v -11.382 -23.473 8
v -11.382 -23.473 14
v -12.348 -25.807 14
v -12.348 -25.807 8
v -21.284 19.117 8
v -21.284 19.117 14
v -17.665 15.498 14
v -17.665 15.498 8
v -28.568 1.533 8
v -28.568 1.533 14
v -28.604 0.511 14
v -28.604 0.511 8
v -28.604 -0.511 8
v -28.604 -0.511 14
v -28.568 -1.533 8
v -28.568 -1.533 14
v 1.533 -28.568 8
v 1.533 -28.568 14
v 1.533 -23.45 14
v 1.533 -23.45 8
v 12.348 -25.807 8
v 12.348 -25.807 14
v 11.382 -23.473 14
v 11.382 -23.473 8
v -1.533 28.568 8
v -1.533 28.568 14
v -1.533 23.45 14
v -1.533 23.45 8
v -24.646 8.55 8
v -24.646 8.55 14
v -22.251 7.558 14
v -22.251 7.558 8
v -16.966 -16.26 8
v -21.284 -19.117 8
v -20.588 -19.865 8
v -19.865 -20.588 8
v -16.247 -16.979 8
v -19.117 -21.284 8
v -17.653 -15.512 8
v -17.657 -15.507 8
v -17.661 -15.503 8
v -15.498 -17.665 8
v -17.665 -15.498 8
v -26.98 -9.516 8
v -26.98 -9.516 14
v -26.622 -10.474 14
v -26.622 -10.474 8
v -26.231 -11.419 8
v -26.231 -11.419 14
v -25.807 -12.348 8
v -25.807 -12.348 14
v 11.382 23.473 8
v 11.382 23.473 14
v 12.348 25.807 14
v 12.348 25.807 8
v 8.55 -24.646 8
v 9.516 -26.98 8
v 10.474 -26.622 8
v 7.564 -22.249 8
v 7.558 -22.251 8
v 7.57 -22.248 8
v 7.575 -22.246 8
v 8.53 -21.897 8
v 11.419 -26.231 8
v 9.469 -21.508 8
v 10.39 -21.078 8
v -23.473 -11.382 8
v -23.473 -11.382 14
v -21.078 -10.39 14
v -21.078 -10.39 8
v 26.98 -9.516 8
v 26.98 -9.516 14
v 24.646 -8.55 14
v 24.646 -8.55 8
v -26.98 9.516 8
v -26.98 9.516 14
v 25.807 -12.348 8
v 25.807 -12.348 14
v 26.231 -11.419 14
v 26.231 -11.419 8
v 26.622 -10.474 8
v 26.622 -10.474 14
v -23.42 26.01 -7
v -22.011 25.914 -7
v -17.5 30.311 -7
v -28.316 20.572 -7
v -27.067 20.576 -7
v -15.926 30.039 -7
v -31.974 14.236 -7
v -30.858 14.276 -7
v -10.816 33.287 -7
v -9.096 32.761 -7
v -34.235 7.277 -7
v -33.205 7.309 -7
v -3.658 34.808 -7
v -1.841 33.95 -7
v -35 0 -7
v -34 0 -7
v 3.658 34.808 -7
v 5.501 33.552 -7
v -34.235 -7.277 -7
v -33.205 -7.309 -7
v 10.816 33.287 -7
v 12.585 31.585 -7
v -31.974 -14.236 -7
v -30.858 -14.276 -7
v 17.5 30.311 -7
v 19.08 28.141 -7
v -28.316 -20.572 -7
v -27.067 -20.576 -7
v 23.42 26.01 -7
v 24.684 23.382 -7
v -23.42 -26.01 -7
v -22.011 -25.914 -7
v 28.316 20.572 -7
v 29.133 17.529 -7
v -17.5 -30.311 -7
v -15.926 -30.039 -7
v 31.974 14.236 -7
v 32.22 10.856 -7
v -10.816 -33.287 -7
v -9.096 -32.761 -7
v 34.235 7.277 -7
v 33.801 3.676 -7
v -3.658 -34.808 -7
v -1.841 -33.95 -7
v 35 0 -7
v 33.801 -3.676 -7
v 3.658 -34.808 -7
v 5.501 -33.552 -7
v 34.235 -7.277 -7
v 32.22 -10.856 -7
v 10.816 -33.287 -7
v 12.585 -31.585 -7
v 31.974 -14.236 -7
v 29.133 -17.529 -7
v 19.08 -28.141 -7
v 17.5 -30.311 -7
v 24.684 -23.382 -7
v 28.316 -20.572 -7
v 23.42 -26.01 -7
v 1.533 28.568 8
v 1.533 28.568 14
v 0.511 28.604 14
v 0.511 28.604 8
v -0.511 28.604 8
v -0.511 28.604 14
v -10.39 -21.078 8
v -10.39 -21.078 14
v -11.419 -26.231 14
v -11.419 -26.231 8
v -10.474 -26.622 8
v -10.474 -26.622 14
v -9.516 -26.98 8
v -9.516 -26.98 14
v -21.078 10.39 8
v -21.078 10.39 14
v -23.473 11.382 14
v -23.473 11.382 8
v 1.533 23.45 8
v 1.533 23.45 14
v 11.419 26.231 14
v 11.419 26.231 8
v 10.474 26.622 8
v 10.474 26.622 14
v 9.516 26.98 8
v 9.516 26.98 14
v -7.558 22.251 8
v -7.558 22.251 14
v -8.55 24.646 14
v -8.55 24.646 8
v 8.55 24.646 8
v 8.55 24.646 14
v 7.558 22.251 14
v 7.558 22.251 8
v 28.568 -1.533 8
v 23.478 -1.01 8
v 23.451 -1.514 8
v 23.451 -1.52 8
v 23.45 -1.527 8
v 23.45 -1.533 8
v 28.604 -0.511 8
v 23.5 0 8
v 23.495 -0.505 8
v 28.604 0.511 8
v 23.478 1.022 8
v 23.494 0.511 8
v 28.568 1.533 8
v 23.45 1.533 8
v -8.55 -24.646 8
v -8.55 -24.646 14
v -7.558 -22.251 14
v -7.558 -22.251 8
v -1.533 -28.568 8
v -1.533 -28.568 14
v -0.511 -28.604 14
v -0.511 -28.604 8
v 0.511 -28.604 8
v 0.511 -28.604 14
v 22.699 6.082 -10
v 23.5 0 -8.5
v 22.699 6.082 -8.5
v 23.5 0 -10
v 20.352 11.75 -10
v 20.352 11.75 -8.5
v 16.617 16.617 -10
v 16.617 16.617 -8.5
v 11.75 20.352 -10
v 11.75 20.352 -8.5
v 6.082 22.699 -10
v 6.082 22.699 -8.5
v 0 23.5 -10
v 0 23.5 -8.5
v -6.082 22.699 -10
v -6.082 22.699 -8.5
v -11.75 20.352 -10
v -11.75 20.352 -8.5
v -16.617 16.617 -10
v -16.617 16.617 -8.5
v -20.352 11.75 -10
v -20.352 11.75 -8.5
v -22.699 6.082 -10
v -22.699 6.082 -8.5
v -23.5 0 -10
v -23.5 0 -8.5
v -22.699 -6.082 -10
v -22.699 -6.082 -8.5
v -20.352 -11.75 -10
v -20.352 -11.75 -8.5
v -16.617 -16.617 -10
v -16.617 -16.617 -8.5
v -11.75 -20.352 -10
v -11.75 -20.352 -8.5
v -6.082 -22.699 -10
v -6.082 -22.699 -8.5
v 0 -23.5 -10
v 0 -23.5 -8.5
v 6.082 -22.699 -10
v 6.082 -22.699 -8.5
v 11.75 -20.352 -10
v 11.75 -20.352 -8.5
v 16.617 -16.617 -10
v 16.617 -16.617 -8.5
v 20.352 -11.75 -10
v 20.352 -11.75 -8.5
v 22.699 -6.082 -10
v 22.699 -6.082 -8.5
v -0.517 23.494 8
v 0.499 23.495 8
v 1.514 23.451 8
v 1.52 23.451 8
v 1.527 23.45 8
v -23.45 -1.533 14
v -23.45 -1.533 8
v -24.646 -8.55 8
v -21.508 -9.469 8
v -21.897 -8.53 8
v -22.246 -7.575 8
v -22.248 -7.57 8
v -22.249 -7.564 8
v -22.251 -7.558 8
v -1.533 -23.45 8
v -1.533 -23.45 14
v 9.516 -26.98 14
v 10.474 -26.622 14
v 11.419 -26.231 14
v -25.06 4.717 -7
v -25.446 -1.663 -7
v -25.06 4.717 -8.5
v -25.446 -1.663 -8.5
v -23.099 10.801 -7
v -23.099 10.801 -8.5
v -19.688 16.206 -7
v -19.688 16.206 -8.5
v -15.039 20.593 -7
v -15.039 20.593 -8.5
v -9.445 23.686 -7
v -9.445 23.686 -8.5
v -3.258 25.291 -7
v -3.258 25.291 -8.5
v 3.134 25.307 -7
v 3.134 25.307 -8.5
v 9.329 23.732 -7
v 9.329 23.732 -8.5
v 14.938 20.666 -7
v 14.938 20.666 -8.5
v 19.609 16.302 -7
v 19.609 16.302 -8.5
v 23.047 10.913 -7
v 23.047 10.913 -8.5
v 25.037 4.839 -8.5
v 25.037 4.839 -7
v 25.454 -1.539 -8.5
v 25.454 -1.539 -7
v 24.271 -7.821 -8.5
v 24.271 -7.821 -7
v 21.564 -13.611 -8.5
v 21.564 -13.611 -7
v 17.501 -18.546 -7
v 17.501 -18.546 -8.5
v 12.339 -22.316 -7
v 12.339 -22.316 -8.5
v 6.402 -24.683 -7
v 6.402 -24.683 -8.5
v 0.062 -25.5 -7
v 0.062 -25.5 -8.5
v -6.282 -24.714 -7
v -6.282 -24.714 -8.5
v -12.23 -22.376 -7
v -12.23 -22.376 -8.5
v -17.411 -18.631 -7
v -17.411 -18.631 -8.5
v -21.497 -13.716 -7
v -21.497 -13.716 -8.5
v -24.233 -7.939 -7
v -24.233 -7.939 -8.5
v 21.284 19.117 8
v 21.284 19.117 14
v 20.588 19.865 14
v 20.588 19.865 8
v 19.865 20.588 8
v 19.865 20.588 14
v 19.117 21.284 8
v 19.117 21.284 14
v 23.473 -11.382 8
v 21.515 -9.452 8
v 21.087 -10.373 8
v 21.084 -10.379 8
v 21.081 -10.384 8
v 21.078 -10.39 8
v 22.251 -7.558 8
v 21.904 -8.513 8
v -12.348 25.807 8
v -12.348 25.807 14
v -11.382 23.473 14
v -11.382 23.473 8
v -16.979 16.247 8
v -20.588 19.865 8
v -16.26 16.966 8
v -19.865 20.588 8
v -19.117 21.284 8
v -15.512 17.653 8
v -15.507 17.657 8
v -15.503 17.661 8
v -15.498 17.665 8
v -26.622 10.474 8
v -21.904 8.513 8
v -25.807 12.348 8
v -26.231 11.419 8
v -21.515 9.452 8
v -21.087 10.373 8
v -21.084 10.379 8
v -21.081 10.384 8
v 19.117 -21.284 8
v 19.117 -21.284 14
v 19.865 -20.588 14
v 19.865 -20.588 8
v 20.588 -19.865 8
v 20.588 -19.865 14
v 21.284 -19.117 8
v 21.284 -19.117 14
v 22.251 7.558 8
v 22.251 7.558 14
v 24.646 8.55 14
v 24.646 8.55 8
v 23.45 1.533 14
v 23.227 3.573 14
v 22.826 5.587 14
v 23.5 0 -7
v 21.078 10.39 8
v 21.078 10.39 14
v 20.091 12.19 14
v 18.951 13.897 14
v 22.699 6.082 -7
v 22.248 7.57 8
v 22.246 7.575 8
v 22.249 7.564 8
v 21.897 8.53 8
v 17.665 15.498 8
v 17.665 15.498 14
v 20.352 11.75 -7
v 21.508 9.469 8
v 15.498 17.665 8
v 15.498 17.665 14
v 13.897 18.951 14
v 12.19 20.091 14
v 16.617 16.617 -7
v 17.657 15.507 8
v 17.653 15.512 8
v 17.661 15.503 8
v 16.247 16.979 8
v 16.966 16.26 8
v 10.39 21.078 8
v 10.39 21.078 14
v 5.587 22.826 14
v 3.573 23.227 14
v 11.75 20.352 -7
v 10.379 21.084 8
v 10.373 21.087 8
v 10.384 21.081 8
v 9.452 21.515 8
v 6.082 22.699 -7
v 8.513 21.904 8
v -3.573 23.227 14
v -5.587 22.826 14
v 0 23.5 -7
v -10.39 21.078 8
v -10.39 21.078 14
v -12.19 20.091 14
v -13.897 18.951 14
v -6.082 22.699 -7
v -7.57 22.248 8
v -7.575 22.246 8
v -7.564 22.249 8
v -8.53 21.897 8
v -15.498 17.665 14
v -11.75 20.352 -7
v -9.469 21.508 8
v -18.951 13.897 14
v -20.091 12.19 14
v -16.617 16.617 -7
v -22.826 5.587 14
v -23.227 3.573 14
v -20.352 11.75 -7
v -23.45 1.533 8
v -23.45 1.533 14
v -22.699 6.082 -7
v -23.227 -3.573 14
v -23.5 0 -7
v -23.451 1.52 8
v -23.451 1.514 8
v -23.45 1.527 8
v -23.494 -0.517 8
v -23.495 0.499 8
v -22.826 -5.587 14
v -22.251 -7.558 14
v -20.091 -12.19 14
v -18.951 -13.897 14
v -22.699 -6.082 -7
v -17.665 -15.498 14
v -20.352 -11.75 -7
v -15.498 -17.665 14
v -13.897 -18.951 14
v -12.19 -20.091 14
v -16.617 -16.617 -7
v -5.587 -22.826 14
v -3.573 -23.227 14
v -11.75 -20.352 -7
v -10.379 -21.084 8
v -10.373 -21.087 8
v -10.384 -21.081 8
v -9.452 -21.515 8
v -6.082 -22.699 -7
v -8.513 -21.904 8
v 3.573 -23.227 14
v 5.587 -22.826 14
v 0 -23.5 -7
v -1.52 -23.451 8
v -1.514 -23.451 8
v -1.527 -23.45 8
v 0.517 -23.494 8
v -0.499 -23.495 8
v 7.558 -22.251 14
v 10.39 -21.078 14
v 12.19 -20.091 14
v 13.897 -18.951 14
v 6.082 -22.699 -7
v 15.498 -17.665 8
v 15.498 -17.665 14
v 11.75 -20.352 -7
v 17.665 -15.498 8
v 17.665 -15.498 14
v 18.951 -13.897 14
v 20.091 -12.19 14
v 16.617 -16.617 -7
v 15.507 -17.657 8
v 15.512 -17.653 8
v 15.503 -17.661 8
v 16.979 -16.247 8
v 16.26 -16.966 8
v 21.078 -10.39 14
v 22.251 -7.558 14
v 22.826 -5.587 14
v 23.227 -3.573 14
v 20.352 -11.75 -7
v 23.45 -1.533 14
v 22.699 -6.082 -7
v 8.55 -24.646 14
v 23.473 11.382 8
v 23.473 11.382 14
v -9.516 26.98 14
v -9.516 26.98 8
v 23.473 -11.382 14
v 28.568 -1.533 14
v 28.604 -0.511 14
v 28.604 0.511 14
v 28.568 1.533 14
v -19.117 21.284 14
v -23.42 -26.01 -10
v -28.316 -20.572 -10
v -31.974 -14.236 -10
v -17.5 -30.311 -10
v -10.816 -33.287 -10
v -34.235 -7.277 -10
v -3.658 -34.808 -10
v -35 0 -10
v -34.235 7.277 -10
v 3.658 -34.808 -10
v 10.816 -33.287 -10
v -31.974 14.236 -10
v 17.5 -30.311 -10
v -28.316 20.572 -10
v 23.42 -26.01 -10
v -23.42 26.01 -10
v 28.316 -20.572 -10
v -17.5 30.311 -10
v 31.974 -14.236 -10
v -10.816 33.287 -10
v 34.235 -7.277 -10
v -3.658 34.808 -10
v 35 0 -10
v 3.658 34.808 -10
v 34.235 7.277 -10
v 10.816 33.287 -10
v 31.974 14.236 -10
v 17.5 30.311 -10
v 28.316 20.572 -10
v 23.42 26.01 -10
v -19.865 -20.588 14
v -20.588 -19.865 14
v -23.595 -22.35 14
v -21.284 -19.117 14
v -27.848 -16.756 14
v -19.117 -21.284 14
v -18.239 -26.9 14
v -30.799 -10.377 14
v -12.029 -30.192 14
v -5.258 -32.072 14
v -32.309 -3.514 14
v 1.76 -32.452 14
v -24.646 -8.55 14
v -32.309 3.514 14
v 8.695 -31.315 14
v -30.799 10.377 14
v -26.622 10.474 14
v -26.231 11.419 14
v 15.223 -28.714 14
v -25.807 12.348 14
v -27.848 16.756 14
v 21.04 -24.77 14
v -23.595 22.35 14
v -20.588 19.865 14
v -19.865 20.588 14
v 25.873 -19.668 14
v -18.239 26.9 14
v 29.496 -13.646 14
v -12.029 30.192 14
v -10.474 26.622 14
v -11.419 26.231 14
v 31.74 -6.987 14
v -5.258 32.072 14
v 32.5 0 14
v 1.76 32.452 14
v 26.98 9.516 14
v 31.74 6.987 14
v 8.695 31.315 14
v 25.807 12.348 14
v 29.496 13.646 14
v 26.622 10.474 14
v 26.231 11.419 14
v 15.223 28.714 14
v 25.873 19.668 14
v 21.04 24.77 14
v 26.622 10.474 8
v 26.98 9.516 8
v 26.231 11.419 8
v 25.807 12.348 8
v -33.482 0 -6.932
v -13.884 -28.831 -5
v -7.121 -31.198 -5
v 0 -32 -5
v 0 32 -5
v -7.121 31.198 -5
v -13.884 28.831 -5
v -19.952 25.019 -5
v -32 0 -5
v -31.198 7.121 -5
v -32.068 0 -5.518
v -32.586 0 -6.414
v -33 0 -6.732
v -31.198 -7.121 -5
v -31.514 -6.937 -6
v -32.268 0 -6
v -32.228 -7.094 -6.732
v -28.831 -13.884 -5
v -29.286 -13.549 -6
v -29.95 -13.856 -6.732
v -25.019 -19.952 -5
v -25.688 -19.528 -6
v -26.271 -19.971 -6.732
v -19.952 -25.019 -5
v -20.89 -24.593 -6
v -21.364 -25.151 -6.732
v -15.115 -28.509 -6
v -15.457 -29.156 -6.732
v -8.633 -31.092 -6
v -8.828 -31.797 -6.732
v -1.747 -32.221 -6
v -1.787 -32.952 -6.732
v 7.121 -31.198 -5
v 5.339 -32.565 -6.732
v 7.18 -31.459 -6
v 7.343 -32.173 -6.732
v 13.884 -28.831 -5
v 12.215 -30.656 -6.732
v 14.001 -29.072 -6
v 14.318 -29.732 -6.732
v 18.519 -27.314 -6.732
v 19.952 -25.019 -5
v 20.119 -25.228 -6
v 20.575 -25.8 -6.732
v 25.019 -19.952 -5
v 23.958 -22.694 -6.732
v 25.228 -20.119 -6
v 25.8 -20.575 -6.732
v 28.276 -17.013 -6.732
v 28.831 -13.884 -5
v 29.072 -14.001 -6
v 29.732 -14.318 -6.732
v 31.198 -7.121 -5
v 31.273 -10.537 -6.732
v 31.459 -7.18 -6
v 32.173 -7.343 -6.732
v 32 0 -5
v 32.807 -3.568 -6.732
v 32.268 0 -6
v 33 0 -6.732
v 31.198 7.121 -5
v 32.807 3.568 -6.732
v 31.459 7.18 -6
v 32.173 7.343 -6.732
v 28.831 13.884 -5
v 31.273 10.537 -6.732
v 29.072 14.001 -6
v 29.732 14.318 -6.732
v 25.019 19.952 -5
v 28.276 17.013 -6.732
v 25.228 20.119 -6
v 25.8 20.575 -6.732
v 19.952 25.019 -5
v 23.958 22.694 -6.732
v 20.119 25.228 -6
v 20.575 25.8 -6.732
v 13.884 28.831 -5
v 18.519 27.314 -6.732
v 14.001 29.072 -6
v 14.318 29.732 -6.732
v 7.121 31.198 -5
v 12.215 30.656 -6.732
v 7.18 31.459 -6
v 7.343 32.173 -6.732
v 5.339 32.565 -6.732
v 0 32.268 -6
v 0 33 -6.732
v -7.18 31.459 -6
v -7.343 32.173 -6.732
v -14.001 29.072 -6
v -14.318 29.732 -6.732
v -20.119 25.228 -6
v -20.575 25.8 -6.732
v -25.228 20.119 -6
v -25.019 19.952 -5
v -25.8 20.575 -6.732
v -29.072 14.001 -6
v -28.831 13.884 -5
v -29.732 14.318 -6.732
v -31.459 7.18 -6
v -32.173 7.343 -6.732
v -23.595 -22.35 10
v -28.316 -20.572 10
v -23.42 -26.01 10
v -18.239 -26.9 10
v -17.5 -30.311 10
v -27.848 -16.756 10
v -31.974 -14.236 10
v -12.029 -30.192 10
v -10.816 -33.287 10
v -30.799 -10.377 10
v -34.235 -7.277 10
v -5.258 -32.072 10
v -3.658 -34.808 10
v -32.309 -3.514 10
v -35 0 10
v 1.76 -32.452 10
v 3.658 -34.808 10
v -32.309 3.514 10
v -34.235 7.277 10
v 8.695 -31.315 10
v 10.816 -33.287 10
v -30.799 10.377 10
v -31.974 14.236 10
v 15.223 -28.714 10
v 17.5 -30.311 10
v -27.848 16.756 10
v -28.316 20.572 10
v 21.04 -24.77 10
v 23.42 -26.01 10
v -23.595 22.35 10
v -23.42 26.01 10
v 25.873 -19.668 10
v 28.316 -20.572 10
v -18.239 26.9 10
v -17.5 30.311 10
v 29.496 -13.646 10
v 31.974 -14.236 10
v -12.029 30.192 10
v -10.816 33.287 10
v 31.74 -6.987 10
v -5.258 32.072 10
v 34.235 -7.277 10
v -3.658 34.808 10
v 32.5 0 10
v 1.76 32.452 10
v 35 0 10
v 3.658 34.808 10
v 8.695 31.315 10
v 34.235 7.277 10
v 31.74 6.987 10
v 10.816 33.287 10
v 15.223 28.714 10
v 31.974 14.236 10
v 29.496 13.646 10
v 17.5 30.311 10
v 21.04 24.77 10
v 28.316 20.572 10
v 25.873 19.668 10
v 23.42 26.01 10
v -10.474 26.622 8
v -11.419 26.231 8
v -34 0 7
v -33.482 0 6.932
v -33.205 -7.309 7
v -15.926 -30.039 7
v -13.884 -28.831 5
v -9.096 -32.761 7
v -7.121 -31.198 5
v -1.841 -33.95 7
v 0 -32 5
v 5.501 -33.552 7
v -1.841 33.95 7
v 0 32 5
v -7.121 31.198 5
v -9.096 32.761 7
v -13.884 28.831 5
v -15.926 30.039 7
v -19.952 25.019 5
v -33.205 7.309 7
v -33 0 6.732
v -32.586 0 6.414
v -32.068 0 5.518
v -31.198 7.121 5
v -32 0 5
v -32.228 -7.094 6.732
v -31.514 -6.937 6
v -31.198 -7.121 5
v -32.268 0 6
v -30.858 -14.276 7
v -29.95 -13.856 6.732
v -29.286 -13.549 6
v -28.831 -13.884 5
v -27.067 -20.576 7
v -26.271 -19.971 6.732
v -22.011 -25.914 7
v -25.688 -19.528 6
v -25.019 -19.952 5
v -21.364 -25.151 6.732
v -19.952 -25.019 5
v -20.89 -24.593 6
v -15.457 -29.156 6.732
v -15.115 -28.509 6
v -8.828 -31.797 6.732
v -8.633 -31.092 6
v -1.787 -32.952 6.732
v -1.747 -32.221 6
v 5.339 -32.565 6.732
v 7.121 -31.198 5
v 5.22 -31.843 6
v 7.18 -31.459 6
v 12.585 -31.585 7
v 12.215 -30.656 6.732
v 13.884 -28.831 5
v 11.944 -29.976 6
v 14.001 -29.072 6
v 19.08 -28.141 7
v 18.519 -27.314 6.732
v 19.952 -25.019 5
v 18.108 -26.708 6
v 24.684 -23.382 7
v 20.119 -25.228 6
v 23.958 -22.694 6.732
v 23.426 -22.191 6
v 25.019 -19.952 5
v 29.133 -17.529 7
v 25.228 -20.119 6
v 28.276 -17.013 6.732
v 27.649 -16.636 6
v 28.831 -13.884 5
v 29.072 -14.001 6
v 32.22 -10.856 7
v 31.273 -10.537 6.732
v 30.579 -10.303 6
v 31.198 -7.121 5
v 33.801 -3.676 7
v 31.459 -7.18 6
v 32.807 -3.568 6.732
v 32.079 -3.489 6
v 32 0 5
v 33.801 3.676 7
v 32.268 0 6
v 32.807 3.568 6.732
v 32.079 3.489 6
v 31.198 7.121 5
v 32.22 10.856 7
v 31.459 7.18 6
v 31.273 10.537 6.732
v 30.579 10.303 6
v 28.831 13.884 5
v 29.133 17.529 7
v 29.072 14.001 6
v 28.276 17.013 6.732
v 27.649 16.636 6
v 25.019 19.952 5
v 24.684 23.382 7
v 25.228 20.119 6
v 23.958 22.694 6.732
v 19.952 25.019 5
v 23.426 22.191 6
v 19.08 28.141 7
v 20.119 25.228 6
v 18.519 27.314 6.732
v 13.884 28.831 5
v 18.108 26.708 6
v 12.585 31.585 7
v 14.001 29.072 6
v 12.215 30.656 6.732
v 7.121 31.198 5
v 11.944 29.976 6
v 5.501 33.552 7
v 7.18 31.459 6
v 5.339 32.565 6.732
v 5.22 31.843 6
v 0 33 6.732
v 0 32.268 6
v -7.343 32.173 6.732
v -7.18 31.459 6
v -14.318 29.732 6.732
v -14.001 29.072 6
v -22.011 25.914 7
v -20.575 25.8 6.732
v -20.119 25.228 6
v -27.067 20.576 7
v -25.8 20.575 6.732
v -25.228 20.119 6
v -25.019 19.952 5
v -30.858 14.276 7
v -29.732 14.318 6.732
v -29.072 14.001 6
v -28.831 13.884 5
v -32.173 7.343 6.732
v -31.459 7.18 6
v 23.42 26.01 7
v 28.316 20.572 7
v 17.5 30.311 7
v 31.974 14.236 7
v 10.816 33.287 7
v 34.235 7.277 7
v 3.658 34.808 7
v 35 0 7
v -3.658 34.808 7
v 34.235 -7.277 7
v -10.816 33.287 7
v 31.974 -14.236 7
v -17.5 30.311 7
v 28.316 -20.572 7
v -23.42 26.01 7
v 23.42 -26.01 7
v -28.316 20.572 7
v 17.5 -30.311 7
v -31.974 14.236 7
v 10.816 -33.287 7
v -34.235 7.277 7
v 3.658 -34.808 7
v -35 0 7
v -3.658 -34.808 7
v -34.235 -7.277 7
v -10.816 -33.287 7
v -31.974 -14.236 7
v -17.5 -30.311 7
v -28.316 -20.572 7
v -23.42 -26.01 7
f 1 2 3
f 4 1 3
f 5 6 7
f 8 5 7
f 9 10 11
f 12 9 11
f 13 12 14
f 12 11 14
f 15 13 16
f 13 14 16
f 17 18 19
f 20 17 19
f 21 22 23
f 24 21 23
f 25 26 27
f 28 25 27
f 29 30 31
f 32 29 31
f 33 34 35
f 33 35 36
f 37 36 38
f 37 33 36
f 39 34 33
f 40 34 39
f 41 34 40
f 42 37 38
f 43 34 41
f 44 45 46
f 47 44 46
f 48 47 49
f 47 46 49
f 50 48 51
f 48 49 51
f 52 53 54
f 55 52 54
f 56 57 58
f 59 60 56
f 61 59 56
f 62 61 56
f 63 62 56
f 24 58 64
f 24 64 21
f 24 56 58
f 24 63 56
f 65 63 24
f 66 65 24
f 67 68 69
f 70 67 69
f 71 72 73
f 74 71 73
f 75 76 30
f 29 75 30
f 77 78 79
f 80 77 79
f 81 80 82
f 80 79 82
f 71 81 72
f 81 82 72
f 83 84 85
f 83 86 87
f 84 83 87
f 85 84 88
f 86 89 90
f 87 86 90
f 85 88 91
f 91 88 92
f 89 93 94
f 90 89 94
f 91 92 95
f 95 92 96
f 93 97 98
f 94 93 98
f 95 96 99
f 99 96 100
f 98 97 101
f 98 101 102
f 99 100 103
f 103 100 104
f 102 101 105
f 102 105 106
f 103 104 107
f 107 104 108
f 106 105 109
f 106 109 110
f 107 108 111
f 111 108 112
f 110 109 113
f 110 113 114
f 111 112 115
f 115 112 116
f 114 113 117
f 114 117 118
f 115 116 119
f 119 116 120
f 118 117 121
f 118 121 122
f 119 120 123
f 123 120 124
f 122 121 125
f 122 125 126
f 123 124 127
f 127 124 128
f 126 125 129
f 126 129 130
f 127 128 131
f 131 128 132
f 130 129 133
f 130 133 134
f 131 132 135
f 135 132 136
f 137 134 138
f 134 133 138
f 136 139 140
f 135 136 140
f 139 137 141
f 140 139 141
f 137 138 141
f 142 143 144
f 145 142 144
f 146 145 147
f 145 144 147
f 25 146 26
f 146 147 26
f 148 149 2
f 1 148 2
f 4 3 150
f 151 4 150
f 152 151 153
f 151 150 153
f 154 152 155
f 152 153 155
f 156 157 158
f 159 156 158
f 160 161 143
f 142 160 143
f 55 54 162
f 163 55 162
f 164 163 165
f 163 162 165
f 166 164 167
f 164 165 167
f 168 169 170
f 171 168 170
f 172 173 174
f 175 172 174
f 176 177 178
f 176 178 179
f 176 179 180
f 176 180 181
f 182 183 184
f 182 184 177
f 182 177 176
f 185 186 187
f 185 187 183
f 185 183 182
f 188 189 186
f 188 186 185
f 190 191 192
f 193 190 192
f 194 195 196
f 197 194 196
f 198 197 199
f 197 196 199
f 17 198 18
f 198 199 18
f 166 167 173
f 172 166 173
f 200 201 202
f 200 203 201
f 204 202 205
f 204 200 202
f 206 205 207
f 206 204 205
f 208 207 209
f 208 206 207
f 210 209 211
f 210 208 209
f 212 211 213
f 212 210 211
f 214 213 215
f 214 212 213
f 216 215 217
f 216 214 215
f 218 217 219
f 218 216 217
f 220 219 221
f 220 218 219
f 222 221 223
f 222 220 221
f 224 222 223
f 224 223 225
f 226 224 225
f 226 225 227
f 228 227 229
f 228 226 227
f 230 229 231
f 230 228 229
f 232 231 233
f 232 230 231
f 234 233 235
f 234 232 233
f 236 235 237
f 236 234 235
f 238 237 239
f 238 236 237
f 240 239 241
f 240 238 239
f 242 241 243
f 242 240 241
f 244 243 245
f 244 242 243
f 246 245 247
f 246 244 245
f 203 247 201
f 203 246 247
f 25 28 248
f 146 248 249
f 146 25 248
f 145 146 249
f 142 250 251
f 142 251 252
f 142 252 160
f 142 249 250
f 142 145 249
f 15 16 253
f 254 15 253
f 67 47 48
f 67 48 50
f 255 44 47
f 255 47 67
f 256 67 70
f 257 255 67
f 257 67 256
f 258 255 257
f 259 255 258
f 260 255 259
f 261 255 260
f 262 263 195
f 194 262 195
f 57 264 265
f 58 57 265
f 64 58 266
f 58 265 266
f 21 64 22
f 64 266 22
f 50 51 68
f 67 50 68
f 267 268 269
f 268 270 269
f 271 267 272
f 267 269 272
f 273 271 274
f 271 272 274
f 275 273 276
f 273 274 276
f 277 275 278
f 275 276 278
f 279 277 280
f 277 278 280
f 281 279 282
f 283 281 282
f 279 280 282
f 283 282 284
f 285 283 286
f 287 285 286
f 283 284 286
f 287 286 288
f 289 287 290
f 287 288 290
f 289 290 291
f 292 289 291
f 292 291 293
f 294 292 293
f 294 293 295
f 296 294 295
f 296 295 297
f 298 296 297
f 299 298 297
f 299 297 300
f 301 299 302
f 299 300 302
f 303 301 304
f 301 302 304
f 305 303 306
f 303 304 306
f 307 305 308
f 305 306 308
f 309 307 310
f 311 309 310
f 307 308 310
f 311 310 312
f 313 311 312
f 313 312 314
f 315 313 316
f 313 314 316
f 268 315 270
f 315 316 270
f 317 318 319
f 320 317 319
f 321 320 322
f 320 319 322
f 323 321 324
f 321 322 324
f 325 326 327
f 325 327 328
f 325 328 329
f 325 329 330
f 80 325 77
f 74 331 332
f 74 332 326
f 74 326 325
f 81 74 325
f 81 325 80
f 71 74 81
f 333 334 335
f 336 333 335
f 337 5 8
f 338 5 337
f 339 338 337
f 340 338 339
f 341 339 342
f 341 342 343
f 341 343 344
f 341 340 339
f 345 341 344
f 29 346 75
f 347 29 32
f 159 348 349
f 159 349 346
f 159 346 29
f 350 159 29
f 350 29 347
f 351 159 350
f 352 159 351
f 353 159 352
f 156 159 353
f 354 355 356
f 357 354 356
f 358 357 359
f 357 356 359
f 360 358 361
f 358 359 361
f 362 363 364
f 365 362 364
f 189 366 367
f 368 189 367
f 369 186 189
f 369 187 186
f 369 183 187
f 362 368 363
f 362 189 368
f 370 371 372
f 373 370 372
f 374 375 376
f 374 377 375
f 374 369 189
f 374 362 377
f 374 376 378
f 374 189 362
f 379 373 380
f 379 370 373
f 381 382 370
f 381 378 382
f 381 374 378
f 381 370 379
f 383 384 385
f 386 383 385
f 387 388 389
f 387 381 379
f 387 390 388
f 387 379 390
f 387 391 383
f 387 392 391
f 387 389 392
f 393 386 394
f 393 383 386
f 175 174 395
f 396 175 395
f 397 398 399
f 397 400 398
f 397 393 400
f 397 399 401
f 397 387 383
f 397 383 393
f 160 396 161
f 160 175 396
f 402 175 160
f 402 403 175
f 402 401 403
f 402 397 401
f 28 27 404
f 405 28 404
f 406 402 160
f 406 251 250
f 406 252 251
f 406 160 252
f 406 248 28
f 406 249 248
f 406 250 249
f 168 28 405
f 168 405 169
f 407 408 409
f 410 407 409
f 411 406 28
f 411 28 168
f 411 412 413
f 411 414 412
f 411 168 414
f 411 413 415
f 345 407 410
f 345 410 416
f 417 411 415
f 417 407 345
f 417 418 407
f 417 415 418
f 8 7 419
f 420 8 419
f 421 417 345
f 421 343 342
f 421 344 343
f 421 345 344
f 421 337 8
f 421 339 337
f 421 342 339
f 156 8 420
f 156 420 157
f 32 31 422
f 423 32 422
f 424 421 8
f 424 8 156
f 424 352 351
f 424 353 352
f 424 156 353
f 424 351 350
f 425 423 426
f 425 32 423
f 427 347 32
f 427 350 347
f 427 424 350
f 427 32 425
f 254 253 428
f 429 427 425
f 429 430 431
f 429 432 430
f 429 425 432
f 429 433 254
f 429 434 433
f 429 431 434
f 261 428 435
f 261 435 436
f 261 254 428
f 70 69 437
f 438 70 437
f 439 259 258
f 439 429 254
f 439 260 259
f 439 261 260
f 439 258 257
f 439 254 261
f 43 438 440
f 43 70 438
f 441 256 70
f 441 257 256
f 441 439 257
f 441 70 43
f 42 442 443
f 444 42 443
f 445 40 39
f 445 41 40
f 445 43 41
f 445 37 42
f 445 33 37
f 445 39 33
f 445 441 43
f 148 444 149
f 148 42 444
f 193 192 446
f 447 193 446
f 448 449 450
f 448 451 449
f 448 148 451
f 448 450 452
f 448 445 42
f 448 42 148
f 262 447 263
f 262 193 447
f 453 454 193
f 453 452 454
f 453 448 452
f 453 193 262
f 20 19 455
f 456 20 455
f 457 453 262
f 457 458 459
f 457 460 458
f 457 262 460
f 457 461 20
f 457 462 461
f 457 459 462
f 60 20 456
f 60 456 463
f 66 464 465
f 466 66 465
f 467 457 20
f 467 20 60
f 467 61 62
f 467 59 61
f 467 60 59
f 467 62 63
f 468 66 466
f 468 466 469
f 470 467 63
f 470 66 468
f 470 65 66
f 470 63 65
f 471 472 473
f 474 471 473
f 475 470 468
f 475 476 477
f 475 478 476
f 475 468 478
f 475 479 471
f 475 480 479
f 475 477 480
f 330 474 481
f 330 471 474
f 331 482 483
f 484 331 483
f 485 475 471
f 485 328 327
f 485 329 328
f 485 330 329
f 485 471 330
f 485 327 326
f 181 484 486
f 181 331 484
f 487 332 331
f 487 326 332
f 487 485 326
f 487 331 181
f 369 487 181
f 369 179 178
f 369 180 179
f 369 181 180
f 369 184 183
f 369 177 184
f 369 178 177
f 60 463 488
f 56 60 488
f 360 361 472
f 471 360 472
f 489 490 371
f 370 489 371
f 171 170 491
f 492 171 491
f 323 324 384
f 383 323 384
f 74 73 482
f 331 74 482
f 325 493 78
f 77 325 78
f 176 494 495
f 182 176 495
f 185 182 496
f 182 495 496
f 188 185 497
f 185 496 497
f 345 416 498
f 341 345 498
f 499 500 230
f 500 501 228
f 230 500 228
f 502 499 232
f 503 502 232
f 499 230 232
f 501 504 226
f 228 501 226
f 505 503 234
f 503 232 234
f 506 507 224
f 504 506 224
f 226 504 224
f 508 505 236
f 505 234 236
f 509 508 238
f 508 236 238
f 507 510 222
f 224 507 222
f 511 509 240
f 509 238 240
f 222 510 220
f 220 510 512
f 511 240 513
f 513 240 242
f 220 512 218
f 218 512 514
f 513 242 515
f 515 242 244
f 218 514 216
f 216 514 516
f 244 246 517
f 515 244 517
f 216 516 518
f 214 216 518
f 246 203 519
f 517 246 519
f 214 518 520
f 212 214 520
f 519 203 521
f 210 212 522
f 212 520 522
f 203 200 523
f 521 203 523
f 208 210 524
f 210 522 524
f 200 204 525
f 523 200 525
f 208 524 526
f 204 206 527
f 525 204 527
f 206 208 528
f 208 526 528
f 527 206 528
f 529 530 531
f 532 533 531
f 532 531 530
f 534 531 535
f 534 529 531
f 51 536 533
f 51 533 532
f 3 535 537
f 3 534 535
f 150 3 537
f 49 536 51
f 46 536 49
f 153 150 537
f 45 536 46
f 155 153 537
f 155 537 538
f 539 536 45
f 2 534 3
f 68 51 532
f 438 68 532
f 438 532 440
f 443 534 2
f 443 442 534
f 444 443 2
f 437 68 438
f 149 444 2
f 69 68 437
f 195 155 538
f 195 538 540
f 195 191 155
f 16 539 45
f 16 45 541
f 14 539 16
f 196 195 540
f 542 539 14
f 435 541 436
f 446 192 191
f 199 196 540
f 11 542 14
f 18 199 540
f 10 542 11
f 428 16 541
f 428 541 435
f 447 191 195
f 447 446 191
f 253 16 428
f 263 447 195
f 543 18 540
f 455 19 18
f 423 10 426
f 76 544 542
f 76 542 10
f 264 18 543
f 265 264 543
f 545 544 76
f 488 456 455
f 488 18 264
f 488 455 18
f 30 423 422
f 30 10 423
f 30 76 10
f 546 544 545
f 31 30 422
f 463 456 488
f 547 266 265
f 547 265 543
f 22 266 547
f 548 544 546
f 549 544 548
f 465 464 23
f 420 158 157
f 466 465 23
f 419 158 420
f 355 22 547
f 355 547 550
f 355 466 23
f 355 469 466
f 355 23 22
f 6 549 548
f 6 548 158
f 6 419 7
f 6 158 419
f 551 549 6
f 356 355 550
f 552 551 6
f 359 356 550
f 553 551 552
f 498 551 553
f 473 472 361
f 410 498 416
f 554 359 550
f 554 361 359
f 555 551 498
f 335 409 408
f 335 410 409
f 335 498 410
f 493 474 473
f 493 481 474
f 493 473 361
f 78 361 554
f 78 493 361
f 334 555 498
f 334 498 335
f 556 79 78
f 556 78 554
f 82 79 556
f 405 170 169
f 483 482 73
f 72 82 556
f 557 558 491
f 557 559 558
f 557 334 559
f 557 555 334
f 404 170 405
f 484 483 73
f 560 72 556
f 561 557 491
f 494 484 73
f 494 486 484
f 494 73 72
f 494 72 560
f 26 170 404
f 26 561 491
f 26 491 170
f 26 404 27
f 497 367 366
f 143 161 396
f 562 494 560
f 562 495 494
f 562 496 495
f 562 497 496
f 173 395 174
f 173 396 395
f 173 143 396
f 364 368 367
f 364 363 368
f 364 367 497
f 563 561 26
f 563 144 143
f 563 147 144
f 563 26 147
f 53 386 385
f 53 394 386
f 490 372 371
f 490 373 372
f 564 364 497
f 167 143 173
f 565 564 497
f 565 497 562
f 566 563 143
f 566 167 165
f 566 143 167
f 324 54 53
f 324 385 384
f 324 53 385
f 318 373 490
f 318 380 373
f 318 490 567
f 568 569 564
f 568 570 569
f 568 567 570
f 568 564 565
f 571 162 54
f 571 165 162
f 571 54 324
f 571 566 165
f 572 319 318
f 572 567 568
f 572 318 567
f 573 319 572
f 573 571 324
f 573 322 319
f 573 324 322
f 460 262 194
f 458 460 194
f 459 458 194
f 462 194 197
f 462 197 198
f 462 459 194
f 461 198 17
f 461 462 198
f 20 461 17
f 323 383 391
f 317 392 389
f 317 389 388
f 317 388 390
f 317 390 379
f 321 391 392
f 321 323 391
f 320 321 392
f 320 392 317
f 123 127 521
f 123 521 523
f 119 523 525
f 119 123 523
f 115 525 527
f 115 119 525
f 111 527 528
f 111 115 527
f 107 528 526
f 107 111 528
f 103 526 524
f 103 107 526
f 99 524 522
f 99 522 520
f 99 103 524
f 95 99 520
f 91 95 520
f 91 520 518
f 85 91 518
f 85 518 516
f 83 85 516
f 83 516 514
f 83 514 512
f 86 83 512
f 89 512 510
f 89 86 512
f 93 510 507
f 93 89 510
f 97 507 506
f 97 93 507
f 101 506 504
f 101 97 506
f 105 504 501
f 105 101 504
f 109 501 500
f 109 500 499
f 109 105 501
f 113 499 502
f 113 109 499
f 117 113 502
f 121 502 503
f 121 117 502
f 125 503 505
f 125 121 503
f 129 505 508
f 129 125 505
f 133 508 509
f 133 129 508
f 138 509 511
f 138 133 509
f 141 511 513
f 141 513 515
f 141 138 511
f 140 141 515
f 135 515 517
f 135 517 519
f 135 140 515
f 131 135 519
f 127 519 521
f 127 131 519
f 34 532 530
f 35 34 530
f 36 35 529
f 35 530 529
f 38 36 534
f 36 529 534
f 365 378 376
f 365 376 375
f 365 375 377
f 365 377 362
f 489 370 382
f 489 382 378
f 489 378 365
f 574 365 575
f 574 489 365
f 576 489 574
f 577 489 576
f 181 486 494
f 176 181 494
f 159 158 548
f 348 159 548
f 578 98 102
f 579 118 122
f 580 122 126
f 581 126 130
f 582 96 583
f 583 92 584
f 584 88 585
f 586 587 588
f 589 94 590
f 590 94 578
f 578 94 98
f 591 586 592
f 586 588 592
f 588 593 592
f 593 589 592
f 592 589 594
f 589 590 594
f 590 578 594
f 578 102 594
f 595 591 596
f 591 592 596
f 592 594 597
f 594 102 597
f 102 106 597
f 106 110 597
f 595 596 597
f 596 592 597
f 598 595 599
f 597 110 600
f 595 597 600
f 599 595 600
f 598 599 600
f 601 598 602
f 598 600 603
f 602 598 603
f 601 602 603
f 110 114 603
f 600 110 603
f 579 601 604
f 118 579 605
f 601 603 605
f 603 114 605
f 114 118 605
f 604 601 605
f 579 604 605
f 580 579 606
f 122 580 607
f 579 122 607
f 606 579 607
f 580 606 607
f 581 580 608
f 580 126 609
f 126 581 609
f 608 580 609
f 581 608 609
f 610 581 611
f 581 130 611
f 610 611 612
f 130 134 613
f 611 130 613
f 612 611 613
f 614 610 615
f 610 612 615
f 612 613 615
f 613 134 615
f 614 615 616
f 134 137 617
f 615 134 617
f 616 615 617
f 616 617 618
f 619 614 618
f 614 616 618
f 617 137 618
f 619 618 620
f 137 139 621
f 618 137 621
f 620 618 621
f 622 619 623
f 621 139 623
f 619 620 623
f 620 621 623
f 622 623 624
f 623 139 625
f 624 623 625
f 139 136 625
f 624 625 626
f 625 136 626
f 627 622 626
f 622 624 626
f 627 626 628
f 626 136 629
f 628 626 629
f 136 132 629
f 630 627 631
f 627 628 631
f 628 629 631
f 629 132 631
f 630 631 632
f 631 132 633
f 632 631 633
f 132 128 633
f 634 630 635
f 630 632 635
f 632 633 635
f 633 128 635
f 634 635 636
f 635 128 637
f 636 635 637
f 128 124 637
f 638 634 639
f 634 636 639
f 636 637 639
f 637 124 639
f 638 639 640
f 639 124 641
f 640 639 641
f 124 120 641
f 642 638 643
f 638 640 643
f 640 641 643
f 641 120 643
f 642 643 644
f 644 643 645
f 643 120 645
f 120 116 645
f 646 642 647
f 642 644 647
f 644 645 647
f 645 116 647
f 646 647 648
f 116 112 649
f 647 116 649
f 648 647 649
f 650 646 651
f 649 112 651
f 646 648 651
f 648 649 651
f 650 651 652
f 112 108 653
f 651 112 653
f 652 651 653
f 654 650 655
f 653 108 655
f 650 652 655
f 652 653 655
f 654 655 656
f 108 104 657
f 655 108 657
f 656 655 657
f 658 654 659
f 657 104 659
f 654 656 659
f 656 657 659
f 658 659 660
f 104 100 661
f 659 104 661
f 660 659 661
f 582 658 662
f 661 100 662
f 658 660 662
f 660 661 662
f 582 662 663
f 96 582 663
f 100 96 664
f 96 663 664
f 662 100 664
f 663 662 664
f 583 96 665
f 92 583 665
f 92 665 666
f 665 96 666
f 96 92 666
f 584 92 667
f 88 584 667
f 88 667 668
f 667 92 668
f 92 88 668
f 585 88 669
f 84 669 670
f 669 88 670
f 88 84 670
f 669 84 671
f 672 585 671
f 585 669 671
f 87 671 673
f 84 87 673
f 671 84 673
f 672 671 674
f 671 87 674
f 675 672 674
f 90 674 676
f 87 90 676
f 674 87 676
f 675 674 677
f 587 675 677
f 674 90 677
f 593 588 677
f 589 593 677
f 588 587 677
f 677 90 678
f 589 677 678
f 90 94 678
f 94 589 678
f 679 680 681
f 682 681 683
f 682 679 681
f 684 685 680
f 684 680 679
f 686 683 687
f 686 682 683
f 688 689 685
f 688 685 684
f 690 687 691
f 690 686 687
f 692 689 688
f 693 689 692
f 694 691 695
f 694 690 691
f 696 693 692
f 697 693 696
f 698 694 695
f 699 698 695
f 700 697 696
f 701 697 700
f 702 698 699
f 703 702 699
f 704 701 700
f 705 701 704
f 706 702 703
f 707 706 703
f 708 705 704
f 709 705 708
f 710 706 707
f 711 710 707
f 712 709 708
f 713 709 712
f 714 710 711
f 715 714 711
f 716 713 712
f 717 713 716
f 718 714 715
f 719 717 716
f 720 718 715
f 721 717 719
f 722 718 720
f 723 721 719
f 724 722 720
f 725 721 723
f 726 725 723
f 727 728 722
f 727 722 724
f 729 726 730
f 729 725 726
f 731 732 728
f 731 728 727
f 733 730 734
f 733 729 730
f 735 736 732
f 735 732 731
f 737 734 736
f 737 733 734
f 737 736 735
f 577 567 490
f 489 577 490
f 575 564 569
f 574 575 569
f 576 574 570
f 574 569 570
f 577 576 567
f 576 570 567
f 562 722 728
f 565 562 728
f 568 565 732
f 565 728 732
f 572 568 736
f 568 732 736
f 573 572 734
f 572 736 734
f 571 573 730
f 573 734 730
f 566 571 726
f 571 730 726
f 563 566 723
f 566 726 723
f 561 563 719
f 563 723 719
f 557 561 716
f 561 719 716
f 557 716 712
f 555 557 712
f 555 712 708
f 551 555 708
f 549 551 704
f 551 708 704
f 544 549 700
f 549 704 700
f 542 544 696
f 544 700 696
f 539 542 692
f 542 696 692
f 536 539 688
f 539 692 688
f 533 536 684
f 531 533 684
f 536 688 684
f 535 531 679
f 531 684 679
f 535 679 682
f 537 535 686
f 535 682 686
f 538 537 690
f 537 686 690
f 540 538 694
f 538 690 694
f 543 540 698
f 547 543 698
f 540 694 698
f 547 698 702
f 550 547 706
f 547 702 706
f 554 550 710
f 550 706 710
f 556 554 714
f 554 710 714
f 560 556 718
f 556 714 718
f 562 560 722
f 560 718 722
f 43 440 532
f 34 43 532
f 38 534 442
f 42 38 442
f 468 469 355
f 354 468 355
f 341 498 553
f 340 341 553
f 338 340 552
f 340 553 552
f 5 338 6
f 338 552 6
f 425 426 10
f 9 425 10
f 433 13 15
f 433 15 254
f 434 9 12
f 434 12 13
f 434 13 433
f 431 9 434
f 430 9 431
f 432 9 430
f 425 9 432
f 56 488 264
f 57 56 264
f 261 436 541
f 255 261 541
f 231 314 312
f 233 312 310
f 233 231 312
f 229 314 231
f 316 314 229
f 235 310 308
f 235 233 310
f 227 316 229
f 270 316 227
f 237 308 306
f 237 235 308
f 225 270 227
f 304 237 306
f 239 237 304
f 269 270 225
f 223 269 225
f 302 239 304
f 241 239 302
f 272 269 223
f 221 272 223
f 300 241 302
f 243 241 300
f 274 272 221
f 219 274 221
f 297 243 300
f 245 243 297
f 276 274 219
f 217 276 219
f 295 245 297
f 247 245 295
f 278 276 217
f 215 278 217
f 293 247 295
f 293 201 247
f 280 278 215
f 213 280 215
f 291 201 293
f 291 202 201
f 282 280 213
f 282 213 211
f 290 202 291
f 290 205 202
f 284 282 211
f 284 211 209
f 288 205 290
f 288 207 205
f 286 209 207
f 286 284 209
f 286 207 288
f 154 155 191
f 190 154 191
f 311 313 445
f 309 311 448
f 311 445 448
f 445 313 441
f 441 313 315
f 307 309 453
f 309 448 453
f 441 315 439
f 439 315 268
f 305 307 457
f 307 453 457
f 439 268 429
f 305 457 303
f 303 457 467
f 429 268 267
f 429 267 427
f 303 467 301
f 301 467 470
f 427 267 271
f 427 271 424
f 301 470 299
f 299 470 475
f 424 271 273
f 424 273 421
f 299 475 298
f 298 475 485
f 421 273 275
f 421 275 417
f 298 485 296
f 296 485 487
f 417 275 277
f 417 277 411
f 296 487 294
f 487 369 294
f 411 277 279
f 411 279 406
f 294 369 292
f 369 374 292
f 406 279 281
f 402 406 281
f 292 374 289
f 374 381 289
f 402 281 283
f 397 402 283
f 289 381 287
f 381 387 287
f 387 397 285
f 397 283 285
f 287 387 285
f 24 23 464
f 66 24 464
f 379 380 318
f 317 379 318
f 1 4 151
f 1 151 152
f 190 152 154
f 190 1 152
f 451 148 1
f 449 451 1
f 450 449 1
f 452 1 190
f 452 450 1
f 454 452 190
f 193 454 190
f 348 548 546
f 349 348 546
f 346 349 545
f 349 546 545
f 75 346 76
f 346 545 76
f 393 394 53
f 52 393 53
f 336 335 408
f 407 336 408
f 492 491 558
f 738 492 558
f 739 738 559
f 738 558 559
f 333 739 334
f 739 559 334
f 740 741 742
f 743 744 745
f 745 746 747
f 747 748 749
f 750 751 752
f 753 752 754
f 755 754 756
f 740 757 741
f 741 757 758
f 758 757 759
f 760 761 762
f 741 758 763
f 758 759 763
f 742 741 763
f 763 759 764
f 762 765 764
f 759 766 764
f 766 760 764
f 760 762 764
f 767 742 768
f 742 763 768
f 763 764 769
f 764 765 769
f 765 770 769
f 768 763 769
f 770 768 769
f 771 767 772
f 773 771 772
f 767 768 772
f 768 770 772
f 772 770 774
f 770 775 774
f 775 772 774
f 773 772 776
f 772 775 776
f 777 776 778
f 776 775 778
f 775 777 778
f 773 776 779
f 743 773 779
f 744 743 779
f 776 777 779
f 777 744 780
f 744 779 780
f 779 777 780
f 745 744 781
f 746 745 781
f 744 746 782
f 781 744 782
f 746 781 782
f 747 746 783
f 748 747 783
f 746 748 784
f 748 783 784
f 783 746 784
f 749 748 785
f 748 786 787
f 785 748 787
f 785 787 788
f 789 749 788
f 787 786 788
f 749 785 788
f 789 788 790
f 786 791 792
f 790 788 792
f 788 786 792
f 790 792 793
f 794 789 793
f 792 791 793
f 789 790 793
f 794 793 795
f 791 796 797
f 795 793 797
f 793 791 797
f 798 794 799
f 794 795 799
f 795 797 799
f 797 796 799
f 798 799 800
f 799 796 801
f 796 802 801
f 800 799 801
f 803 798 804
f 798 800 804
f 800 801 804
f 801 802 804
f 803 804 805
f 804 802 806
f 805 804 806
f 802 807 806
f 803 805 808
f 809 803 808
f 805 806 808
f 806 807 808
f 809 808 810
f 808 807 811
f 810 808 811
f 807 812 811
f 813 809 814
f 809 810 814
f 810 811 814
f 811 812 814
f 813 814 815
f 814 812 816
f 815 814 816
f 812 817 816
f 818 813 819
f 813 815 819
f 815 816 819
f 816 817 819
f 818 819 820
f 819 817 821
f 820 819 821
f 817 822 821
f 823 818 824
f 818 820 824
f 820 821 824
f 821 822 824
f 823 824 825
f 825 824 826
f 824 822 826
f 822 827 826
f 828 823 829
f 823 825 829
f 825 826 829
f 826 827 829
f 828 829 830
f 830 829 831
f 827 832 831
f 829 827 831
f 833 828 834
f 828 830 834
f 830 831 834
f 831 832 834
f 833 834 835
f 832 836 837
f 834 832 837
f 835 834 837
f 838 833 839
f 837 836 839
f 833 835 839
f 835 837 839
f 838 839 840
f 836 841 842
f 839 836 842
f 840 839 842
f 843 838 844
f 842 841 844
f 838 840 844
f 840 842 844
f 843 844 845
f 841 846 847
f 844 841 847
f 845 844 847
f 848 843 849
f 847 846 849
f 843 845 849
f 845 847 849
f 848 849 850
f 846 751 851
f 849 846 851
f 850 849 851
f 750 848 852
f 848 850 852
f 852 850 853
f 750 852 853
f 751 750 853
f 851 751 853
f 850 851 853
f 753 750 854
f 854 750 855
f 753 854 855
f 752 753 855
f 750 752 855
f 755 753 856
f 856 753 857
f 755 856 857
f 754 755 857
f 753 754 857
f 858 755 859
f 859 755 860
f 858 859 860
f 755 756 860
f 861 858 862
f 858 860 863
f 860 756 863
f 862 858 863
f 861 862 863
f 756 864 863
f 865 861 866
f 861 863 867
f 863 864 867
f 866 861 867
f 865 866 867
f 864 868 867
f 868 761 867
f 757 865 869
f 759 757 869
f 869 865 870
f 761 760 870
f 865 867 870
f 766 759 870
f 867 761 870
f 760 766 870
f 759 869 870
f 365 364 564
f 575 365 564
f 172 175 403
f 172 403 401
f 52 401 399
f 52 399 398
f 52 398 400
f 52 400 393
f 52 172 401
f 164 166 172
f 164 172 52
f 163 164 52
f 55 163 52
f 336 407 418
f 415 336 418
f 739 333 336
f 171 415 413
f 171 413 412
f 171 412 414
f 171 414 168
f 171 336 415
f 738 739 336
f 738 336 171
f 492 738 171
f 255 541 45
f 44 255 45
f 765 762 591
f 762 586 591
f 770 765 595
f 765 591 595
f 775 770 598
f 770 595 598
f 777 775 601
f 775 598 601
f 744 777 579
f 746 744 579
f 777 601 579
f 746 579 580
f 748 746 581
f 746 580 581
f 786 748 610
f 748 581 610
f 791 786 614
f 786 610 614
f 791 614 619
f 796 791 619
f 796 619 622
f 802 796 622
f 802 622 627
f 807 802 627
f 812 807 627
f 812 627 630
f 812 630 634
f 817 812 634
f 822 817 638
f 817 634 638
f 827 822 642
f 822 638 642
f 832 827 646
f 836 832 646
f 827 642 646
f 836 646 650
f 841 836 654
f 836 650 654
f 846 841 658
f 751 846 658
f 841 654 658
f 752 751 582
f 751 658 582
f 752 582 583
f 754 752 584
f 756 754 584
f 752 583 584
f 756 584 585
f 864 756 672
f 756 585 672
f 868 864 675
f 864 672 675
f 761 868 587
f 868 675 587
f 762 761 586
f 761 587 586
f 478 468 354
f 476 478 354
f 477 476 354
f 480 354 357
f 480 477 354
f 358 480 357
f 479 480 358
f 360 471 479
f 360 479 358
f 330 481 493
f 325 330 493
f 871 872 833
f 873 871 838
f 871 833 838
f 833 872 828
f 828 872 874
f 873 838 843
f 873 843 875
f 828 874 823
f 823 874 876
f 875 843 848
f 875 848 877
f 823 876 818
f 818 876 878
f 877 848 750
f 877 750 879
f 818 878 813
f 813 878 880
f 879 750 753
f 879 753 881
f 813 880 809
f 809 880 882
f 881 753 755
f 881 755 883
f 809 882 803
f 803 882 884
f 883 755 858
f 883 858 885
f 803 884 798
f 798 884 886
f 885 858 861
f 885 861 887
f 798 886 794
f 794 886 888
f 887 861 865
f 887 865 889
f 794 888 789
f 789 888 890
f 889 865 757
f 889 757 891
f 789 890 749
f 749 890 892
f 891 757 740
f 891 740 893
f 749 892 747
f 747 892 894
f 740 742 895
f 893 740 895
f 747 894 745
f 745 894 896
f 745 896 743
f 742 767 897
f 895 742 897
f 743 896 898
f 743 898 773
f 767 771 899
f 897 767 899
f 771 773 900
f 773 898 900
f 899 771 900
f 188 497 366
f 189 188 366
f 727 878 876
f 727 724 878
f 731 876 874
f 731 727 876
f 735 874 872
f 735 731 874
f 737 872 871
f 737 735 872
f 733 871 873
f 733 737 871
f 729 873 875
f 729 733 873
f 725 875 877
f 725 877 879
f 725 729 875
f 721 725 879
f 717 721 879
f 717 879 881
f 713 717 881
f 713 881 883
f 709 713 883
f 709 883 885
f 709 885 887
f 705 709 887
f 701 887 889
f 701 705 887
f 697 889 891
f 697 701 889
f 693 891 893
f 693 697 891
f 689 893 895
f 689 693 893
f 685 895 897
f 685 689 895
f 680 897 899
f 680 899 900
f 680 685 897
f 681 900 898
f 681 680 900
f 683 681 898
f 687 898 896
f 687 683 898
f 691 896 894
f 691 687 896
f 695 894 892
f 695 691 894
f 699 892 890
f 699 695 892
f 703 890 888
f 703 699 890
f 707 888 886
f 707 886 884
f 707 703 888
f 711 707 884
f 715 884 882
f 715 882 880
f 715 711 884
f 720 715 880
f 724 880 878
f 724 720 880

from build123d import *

# Parameters (mm, degrees)
SKETCH_1_R          = 35
SKETCH_1_R_2        = 25
SKETCH_1_R_3        = 23.5
EXTRUDE_1_DEPTH     = 10
SKETCH_3_R          = 32.5
SKETCH_3_R_2        = 23.5
EXTRUDE_2_DEPTH     = 4
CUT_EXTRUDE_1_DEPTH = 6
SKETCH_7_W          = 1.5
SKETCH_7_H          = 2


with BuildPart() as part:
    # 草图1 → 凸台-拉伸1 (new, symmetric)
    with BuildSketch(Plane.XY):
        Circle(SKETCH_1_R)
        Circle(SKETCH_1_R_2, mode=Mode.SUBTRACT)
        Circle(SKETCH_1_R_2)
        Circle(SKETCH_1_R_3, mode=Mode.SUBTRACT)
    extrude(amount=EXTRUDE_1_DEPTH, both=True)

    # 草图2 → 切除-旋转1 (revolve, cut)
    with BuildSketch(Plane(origin=(0, 0, 0), x_dir=(0, 0, -1), z_dir=(1, 0, 0)), mode=Mode.PRIVATE) as cut_revolve_1_sk:
        with BuildLine():
            Line((-7, 40), (-7, 34))
            ThreePointArc((-7, 34), (-6.414213562, 32.585786438), (-5, 32))
            Line((-5, 32), (5, 32))
            ThreePointArc((5, 32), (6.414213562, 32.585786438), (7, 34))
            Line((7, 34), (7, 40))
            Line((7, 40), (-7, 40))
        make_face()
    revolve(cut_revolve_1_sk.sketch.rotate(Axis((0, 0, 0), (0, 0, 1)), 90), axis=Axis((0, 0, 0), (0, 0, 1)), mode=Mode.SUBTRACT)

    # 草图3 → 凸台-拉伸2 (add)
    with BuildSketch(Plane.XY.offset(10)):
        Circle(SKETCH_3_R)
        Circle(SKETCH_3_R_2, mode=Mode.SUBTRACT)
    extrude(amount=EXTRUDE_2_DEPTH)

    # 草图5 → 切除-拉伸1 (cut)
    with BuildSketch(Plane.XY.offset(14)):
        with BuildLine():
            ThreePointArc((19.116635677, -21.28407168), (20.229402697, -20.229402697), (21.28407168, -19.116635677))
            Line((21.28407168, -19.116635677), (19.498162716, -17.330726713))
            Line((19.498162716, -17.330726713), (17.665351072, -15.497915069))
            ThreePointArc((17.665351072, -15.497915069), (16.623496591, -16.610519591), (15.511706041, -17.65324264))
            ThreePointArc((15.511706041, -17.65324264), (15.504811737, -17.659298202), (15.497915069, -17.665351072))
            Line((15.497915069, -17.665351072), (17.330726713, -19.498162716))
            Line((17.330726713, -19.498162716), (19.116635677, -21.28407168))
        make_face()
        with BuildLine():
            ThreePointArc((25.806530038, -12.348298438), (26.430988365, -10.948073848), (26.97953795, -9.516406827))
            Line((26.97953795, -9.516406827), (24.646135439, -8.549879861))
            Line((24.646135439, -8.549879861), (22.251451624, -7.557969347))
            ThreePointArc((22.251451624, -7.557969347), (21.71467891, -8.984582342), (21.086551211, -10.373396648))
            ThreePointArc((21.086551211, -10.373396648), (21.082499068, -10.381629594), (21.078443711, -10.389860957))
            Line((21.078443711, -10.389860957), (23.473127527, -11.381771471))
            Line((23.473127527, -11.381771471), (25.806530038, -12.348298438))
        make_face()
        with BuildLine():
            ThreePointArc((28.567614137, -1.532608696), (28.608695652, 0), (28.567614137, 1.532608696))
            Line((28.567614137, 1.532608696), (26.041957459, 1.532608696))
            Line((26.041957459, 1.532608696), (23.449970375, 1.532608696))
            ThreePointArc((23.449970375, 1.532608696), (23.487489264, 0.766712524), (23.5, 0))
            ThreePointArc((23.5, 0), (23.487786854, -0.757541226), (23.45116011, -1.514295052))
            ThreePointArc((23.45116011, -1.514295052), (23.45056703, -1.52345199), (23.449970375, -1.532608696))
            Line((23.449970375, -1.532608696), (26.041957459, -1.532608696))
            Line((26.041957459, -1.532608696), (28.567614137, -1.532608696))
        make_face()
        with BuildLine():
            ThreePointArc((26.97953795, 9.516406827), (26.430988365, 10.948073848), (25.806530038, 12.348298438))
            Line((25.806530038, 12.348298438), (23.473127527, 11.381771471))
            Line((23.473127527, 11.381771471), (21.078443711, 10.389860957))
            ThreePointArc((21.078443711, 10.389860957), (21.707655808, 9.001537608), (22.245542467, 7.575344239))
            ThreePointArc((22.245542467, 7.575344239), (22.248498741, 7.56665737), (22.251451624, 7.557969347))
            Line((22.251451624, 7.557969347), (24.646135439, 8.549879861))
            Line((24.646135439, 8.549879861), (26.97953795, 9.516406827))
        make_face()
        with BuildLine():
            ThreePointArc((21.28407168, 19.116635677), (20.229402697, 20.229402697), (19.116635677, 21.28407168))
            Line((19.116635677, 21.28407168), (17.330726713, 19.498162716))
            Line((17.330726713, 19.498162716), (15.497915069, 17.665351072))
            ThreePointArc((15.497915069, 17.665351072), (16.610519591, 16.623496591), (17.65324264, 15.511706041))
            ThreePointArc((17.65324264, 15.511706041), (17.659298202, 15.504811737), (17.665351072, 15.497915069))
            Line((17.665351072, 15.497915069), (19.498162716, 17.330726713))
            Line((19.498162716, 17.330726713), (21.28407168, 19.116635677))
        make_face()
        with BuildLine():
            Line((9.516406827, 26.97953795), (8.549879861, 24.646135439))
            Line((8.549879861, 24.646135439), (7.557969347, 22.251451624))
            ThreePointArc((7.557969347, 22.251451624), (8.984582342, 21.71467891), (10.373396648, 21.086551211))
            ThreePointArc((10.373396648, 21.086551211), (10.381629594, 21.082499068), (10.389860957, 21.078443711))
            Line((10.389860957, 21.078443711), (11.381771471, 23.473127527))
            Line((11.381771471, 23.473127527), (12.348298438, 25.806530038))
            ThreePointArc((12.348298438, 25.806530038), (10.948073848, 26.430988365), (9.516406827, 26.97953795))
        make_face()
        with BuildLine():
            ThreePointArc((1.514295052, 23.45116011), (1.52345199, 23.45056703), (1.532608696, 23.449970375))
            Line((1.532608696, 23.449970375), (1.532608696, 26.041957459))
            Line((1.532608696, 26.041957459), (1.532608696, 28.567614137))
            ThreePointArc((1.532608696, 28.567614137), (0, 28.608695652), (-1.532608696, 28.567614137))
            Line((-1.532608696, 28.567614137), (-1.532608696, 26.041957459))
            Line((-1.532608696, 26.041957459), (-1.532608696, 23.449970375))
            ThreePointArc((-1.532608696, 23.449970375), (-0.009176124, 23.499998208), (1.514295052, 23.45116011))
        make_face()
        with BuildLine():
            ThreePointArc((9.516406827, -26.97953795), (10.948073848, -26.430988365), (12.348298438, -25.806530038))
            Line((12.348298438, -25.806530038), (11.381771471, -23.473127527))
            Line((11.381771471, -23.473127527), (10.389860957, -21.078443711))
            ThreePointArc((10.389860957, -21.078443711), (9.001537608, -21.707655808), (7.575344239, -22.245542467))
            ThreePointArc((7.575344239, -22.245542467), (7.56665737, -22.248498741), (7.557969347, -22.251451624))
            Line((7.557969347, -22.251451624), (8.549879861, -24.646135439))
            Line((8.549879861, -24.646135439), (9.516406827, -26.97953795))
        make_face()
        with BuildLine():
            ThreePointArc((-1.532608696, -28.567614137), (0, -28.608695652), (1.532608696, -28.567614137))
            Line((1.532608696, -28.567614137), (1.532608696, -26.041957459))
            Line((1.532608696, -26.041957459), (1.532608696, -23.449970375))
            ThreePointArc((1.532608696, -23.449970375), (0.009176124, -23.499998208), (-1.514295052, -23.45116011))
            ThreePointArc((-1.514295052, -23.45116011), (-1.52345199, -23.45056703), (-1.532608696, -23.449970375))
            Line((-1.532608696, -23.449970375), (-1.532608696, -26.041957459))
            Line((-1.532608696, -26.041957459), (-1.532608696, -28.567614137))
        make_face()
        with BuildLine():
            Line((-11.381771471, -23.473127527), (-12.348298438, -25.806530038))
            ThreePointArc((-12.348298438, -25.806530038), (-10.948073848, -26.430988365), (-9.516406827, -26.97953795))
            Line((-9.516406827, -26.97953795), (-8.549879861, -24.646135439))
            Line((-8.549879861, -24.646135439), (-7.557969347, -22.251451624))
            ThreePointArc((-7.557969347, -22.251451624), (-8.984582342, -21.71467891), (-10.373396648, -21.086551211))
            ThreePointArc((-10.373396648, -21.086551211), (-10.381629594, -21.082499068), (-10.389860957, -21.078443711))
            Line((-10.389860957, -21.078443711), (-11.381771471, -23.473127527))
        make_face()
        with BuildLine():
            Line((-19.498162716, -17.330726713), (-21.28407168, -19.116635677))
            ThreePointArc((-21.28407168, -19.116635677), (-20.229402697, -20.229402697), (-19.116635677, -21.28407168))
            Line((-19.116635677, -21.28407168), (-17.330726713, -19.498162716))
            Line((-17.330726713, -19.498162716), (-15.497915069, -17.665351072))
            ThreePointArc((-15.497915069, -17.665351072), (-16.610519591, -16.623496591), (-17.65324264, -15.511706041))
            ThreePointArc((-17.65324264, -15.511706041), (-17.659298202, -15.504811737), (-17.665351072, -15.497915069))
            Line((-17.665351072, -15.497915069), (-19.498162716, -17.330726713))
        make_face()
        with BuildLine():
            Line((-24.646135439, -8.549879861), (-26.97953795, -9.516406827))
            ThreePointArc((-26.97953795, -9.516406827), (-26.430988365, -10.948073848), (-25.806530038, -12.348298438))
            Line((-25.806530038, -12.348298438), (-23.473127527, -11.381771471))
            Line((-23.473127527, -11.381771471), (-21.078443711, -10.389860957))
            ThreePointArc((-21.078443711, -10.389860957), (-21.707655808, -9.001537608), (-22.245542467, -7.575344239))
            ThreePointArc((-22.245542467, -7.575344239), (-22.248498741, -7.56665737), (-22.251451624, -7.557969347))
            Line((-22.251451624, -7.557969347), (-24.646135439, -8.549879861))
        make_face()
        with BuildLine():
            Line((-26.041957459, 1.532608696), (-28.567614137, 1.532608696))
            ThreePointArc((-28.567614137, 1.532608696), (-28.608695652, 0), (-28.567614137, -1.532608696))
            Line((-28.567614137, -1.532608696), (-26.041957459, -1.532608696))
            Line((-26.041957459, -1.532608696), (-23.449970375, -1.532608696))
            ThreePointArc((-23.449970375, -1.532608696), (-23.499998208, -0.009176124), (-23.45116011, 1.514295052))
            ThreePointArc((-23.45116011, 1.514295052), (-23.45056703, 1.52345199), (-23.449970375, 1.532608696))
            Line((-23.449970375, 1.532608696), (-26.041957459, 1.532608696))
        make_face()
        with BuildLine():
            Line((-23.473127527, 11.381771471), (-25.806530038, 12.348298438))
            ThreePointArc((-25.806530038, 12.348298438), (-26.430988365, 10.948073848), (-26.97953795, 9.516406827))
            Line((-26.97953795, 9.516406827), (-24.646135439, 8.549879861))
            Line((-24.646135439, 8.549879861), (-22.251451624, 7.557969347))
            ThreePointArc((-22.251451624, 7.557969347), (-21.71467891, 8.984582342), (-21.086551211, 10.373396648))
            ThreePointArc((-21.086551211, 10.373396648), (-21.082499068, 10.381629594), (-21.078443711, 10.389860957))
            Line((-21.078443711, 10.389860957), (-23.473127527, 11.381771471))
        make_face()
        with BuildLine():
            Line((-17.330726713, 19.498162716), (-19.116635677, 21.28407168))
            ThreePointArc((-19.116635677, 21.28407168), (-20.229402697, 20.229402697), (-21.28407168, 19.116635677))
            Line((-21.28407168, 19.116635677), (-19.498162716, 17.330726713))
            Line((-19.498162716, 17.330726713), (-17.665351072, 15.497915069))
            ThreePointArc((-17.665351072, 15.497915069), (-16.623496591, 16.610519591), (-15.511706041, 17.65324264))
            ThreePointArc((-15.511706041, 17.65324264), (-15.504811737, 17.659298202), (-15.497915069, 17.665351072))
            Line((-15.497915069, 17.665351072), (-17.330726713, 19.498162716))
        make_face()
        with BuildLine():
            Line((-8.549879861, 24.646135439), (-9.516406827, 26.97953795))
            ThreePointArc((-9.516406827, 26.97953795), (-10.948073848, 26.430988365), (-12.348298438, 25.806530038))
            Line((-12.348298438, 25.806530038), (-11.381771471, 23.473127527))
            Line((-11.381771471, 23.473127527), (-10.389860957, 21.078443711))
            ThreePointArc((-10.389860957, 21.078443711), (-9.001537608, 21.707655808), (-7.575344239, 22.245542467))
            ThreePointArc((-7.575344239, 22.245542467), (-7.56665737, 22.248498741), (-7.557969347, 22.251451624))
            Line((-7.557969347, 22.251451624), (-8.549879861, 24.646135439))
        make_face()
    extrude(amount=-CUT_EXTRUDE_1_DEPTH, mode=Mode.SUBTRACT)

    # 草图7 → 切除-旋转2 (revolve, cut)
    with BuildSketch(Plane(origin=(0, 0, 0), x_dir=(0, 0, -1), z_dir=(1, 0, 0)), mode=Mode.PRIVATE) as cut_revolve_2_sk:
        with Locations((7.75, 24.5)):
            Rectangle(SKETCH_7_W, SKETCH_7_H)
    revolve(cut_revolve_2_sk.sketch.rotate(Axis((0, 0, 0), (0, 0, -1)), 266.260664768), axis=Axis((0, 0, 0), (0, 0, -1)), mode=Mode.SUBTRACT)


solid = part.part
